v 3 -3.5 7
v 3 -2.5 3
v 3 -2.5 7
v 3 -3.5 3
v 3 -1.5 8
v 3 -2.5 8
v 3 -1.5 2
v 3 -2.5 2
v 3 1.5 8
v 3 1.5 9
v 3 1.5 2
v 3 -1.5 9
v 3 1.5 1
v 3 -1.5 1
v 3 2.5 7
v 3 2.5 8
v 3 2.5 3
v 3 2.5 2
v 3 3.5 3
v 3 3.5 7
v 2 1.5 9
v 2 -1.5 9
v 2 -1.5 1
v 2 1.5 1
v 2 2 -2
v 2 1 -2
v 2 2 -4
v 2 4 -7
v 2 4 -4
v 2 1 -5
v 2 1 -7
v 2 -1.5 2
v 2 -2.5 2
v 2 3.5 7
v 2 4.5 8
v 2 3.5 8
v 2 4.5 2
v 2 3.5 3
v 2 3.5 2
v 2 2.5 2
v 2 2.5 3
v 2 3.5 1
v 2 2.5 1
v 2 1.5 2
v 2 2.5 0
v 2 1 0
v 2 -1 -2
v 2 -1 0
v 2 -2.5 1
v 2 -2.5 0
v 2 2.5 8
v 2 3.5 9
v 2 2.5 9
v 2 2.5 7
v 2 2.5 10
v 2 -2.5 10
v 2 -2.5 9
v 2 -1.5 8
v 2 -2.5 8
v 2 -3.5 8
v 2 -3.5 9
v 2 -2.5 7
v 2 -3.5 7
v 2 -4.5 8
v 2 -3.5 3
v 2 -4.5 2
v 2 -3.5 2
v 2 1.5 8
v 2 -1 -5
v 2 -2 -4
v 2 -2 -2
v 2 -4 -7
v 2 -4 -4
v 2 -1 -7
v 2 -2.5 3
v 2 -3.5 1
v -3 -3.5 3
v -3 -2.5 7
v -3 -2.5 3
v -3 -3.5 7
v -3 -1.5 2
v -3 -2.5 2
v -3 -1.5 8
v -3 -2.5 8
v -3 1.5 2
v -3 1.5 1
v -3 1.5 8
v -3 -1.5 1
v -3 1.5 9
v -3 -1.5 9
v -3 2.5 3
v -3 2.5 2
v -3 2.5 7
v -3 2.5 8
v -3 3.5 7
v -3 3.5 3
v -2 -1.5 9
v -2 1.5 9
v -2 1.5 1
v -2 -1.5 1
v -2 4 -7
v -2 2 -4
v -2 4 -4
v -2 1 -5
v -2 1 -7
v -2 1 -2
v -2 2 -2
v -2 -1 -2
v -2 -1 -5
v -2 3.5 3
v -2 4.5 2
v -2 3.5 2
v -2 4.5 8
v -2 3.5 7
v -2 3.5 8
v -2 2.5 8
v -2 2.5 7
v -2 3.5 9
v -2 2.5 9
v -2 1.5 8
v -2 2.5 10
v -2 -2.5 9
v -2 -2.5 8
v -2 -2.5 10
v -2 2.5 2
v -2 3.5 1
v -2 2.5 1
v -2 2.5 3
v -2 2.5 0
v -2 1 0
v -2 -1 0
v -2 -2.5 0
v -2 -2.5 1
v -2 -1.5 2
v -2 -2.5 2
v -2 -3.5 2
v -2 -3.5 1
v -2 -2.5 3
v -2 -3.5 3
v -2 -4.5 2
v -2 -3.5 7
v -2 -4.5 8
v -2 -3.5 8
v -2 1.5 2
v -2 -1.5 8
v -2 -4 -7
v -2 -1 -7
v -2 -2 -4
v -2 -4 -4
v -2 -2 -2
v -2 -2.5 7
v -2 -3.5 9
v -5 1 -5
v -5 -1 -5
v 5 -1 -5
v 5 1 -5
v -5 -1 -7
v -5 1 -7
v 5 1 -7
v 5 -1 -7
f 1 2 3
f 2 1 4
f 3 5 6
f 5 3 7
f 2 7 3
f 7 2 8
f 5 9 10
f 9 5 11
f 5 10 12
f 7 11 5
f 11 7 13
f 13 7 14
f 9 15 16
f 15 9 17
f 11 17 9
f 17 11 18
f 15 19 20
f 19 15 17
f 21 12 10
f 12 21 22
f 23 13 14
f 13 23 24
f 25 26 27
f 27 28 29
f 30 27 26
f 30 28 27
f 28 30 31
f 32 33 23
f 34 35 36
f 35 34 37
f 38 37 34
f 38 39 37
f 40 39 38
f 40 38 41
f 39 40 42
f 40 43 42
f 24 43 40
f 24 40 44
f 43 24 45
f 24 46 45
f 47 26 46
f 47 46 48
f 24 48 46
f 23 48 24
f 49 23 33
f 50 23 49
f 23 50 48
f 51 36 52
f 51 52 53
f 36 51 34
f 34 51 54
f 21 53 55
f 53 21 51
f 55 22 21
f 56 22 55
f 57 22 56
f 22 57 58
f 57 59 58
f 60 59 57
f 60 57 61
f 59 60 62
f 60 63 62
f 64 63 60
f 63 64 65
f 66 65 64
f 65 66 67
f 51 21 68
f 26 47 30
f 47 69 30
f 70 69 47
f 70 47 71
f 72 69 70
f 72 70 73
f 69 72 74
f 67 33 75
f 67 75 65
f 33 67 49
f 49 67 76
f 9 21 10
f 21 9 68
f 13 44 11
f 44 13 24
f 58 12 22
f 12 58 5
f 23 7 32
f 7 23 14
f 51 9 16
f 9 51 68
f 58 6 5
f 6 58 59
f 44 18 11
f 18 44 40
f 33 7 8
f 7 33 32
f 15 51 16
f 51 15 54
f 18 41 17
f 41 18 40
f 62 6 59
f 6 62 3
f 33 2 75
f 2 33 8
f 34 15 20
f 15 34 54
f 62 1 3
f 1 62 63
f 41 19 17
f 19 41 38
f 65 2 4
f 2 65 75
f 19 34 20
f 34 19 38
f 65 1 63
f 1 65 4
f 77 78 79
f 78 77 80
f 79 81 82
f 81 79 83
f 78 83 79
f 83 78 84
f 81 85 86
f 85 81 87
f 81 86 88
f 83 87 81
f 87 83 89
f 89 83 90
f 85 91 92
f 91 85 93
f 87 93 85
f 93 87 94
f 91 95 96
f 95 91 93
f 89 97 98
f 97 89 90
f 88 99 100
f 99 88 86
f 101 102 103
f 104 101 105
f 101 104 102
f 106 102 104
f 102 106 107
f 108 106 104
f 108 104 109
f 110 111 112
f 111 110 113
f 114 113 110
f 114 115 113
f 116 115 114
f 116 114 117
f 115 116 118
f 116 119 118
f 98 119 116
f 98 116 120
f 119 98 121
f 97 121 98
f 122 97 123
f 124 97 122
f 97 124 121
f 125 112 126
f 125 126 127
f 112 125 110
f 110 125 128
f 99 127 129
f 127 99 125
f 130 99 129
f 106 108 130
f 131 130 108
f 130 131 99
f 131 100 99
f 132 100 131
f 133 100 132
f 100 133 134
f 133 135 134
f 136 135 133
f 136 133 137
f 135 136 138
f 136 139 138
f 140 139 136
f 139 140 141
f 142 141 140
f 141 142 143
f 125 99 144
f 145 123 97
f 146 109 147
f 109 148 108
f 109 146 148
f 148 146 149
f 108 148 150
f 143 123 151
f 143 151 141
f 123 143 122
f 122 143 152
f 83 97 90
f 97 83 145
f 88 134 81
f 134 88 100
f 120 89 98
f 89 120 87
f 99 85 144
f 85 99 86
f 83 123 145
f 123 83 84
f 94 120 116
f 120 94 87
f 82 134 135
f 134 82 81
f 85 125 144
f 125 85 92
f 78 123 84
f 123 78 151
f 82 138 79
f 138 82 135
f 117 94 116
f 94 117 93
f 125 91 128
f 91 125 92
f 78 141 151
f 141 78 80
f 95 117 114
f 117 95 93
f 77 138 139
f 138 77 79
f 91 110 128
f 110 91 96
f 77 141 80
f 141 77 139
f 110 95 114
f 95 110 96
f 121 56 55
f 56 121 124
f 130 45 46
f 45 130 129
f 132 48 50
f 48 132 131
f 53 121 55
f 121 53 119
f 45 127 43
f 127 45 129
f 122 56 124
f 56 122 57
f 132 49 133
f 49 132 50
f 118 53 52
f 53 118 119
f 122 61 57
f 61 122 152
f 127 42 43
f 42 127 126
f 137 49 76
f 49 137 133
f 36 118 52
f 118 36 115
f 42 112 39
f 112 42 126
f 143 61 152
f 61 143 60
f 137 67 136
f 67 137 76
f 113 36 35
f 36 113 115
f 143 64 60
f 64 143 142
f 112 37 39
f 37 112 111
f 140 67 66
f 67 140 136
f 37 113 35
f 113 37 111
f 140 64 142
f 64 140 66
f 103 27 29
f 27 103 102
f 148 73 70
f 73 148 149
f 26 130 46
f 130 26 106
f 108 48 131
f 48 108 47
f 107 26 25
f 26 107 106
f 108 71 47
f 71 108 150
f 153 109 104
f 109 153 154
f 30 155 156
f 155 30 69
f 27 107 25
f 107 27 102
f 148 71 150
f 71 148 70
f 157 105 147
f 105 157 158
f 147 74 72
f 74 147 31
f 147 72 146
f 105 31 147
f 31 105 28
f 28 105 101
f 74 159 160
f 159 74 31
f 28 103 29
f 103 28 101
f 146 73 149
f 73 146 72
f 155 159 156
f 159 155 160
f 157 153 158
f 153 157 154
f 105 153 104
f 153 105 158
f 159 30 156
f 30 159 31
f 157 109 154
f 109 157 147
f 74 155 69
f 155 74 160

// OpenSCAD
module canopy() {
  translate([0, 0, 5]) {
    cube([4, 5, 10], center=true);
    cube([4, 7, 8], center=true);
    cube([4, 9, 6], center=true);

    for (angle = [0, 180]) {
      rotate(a=[0, 0, angle]) translate([2.5, 0, 0]) {
        cube([1, 3, 8], center=true);
        cube([1, 5, 6], center=true);
        cube([1, 7, 4], center=true);
      }
    }
  }
}

module trunk() {
  translate([0, 0, -2]) cube(size=[4, 2, 4], center=true);
  translate([0, 0, -3.5]) cube(size=[4, 4, 3], center=true);
  translate([0, 0, -5.5]) cube(size=[4, 8, 3], center=true);
  translate([0, 0, -6]) cube(size=[10, 2, 2], center=true);
  
}

canopy();
trunk();
